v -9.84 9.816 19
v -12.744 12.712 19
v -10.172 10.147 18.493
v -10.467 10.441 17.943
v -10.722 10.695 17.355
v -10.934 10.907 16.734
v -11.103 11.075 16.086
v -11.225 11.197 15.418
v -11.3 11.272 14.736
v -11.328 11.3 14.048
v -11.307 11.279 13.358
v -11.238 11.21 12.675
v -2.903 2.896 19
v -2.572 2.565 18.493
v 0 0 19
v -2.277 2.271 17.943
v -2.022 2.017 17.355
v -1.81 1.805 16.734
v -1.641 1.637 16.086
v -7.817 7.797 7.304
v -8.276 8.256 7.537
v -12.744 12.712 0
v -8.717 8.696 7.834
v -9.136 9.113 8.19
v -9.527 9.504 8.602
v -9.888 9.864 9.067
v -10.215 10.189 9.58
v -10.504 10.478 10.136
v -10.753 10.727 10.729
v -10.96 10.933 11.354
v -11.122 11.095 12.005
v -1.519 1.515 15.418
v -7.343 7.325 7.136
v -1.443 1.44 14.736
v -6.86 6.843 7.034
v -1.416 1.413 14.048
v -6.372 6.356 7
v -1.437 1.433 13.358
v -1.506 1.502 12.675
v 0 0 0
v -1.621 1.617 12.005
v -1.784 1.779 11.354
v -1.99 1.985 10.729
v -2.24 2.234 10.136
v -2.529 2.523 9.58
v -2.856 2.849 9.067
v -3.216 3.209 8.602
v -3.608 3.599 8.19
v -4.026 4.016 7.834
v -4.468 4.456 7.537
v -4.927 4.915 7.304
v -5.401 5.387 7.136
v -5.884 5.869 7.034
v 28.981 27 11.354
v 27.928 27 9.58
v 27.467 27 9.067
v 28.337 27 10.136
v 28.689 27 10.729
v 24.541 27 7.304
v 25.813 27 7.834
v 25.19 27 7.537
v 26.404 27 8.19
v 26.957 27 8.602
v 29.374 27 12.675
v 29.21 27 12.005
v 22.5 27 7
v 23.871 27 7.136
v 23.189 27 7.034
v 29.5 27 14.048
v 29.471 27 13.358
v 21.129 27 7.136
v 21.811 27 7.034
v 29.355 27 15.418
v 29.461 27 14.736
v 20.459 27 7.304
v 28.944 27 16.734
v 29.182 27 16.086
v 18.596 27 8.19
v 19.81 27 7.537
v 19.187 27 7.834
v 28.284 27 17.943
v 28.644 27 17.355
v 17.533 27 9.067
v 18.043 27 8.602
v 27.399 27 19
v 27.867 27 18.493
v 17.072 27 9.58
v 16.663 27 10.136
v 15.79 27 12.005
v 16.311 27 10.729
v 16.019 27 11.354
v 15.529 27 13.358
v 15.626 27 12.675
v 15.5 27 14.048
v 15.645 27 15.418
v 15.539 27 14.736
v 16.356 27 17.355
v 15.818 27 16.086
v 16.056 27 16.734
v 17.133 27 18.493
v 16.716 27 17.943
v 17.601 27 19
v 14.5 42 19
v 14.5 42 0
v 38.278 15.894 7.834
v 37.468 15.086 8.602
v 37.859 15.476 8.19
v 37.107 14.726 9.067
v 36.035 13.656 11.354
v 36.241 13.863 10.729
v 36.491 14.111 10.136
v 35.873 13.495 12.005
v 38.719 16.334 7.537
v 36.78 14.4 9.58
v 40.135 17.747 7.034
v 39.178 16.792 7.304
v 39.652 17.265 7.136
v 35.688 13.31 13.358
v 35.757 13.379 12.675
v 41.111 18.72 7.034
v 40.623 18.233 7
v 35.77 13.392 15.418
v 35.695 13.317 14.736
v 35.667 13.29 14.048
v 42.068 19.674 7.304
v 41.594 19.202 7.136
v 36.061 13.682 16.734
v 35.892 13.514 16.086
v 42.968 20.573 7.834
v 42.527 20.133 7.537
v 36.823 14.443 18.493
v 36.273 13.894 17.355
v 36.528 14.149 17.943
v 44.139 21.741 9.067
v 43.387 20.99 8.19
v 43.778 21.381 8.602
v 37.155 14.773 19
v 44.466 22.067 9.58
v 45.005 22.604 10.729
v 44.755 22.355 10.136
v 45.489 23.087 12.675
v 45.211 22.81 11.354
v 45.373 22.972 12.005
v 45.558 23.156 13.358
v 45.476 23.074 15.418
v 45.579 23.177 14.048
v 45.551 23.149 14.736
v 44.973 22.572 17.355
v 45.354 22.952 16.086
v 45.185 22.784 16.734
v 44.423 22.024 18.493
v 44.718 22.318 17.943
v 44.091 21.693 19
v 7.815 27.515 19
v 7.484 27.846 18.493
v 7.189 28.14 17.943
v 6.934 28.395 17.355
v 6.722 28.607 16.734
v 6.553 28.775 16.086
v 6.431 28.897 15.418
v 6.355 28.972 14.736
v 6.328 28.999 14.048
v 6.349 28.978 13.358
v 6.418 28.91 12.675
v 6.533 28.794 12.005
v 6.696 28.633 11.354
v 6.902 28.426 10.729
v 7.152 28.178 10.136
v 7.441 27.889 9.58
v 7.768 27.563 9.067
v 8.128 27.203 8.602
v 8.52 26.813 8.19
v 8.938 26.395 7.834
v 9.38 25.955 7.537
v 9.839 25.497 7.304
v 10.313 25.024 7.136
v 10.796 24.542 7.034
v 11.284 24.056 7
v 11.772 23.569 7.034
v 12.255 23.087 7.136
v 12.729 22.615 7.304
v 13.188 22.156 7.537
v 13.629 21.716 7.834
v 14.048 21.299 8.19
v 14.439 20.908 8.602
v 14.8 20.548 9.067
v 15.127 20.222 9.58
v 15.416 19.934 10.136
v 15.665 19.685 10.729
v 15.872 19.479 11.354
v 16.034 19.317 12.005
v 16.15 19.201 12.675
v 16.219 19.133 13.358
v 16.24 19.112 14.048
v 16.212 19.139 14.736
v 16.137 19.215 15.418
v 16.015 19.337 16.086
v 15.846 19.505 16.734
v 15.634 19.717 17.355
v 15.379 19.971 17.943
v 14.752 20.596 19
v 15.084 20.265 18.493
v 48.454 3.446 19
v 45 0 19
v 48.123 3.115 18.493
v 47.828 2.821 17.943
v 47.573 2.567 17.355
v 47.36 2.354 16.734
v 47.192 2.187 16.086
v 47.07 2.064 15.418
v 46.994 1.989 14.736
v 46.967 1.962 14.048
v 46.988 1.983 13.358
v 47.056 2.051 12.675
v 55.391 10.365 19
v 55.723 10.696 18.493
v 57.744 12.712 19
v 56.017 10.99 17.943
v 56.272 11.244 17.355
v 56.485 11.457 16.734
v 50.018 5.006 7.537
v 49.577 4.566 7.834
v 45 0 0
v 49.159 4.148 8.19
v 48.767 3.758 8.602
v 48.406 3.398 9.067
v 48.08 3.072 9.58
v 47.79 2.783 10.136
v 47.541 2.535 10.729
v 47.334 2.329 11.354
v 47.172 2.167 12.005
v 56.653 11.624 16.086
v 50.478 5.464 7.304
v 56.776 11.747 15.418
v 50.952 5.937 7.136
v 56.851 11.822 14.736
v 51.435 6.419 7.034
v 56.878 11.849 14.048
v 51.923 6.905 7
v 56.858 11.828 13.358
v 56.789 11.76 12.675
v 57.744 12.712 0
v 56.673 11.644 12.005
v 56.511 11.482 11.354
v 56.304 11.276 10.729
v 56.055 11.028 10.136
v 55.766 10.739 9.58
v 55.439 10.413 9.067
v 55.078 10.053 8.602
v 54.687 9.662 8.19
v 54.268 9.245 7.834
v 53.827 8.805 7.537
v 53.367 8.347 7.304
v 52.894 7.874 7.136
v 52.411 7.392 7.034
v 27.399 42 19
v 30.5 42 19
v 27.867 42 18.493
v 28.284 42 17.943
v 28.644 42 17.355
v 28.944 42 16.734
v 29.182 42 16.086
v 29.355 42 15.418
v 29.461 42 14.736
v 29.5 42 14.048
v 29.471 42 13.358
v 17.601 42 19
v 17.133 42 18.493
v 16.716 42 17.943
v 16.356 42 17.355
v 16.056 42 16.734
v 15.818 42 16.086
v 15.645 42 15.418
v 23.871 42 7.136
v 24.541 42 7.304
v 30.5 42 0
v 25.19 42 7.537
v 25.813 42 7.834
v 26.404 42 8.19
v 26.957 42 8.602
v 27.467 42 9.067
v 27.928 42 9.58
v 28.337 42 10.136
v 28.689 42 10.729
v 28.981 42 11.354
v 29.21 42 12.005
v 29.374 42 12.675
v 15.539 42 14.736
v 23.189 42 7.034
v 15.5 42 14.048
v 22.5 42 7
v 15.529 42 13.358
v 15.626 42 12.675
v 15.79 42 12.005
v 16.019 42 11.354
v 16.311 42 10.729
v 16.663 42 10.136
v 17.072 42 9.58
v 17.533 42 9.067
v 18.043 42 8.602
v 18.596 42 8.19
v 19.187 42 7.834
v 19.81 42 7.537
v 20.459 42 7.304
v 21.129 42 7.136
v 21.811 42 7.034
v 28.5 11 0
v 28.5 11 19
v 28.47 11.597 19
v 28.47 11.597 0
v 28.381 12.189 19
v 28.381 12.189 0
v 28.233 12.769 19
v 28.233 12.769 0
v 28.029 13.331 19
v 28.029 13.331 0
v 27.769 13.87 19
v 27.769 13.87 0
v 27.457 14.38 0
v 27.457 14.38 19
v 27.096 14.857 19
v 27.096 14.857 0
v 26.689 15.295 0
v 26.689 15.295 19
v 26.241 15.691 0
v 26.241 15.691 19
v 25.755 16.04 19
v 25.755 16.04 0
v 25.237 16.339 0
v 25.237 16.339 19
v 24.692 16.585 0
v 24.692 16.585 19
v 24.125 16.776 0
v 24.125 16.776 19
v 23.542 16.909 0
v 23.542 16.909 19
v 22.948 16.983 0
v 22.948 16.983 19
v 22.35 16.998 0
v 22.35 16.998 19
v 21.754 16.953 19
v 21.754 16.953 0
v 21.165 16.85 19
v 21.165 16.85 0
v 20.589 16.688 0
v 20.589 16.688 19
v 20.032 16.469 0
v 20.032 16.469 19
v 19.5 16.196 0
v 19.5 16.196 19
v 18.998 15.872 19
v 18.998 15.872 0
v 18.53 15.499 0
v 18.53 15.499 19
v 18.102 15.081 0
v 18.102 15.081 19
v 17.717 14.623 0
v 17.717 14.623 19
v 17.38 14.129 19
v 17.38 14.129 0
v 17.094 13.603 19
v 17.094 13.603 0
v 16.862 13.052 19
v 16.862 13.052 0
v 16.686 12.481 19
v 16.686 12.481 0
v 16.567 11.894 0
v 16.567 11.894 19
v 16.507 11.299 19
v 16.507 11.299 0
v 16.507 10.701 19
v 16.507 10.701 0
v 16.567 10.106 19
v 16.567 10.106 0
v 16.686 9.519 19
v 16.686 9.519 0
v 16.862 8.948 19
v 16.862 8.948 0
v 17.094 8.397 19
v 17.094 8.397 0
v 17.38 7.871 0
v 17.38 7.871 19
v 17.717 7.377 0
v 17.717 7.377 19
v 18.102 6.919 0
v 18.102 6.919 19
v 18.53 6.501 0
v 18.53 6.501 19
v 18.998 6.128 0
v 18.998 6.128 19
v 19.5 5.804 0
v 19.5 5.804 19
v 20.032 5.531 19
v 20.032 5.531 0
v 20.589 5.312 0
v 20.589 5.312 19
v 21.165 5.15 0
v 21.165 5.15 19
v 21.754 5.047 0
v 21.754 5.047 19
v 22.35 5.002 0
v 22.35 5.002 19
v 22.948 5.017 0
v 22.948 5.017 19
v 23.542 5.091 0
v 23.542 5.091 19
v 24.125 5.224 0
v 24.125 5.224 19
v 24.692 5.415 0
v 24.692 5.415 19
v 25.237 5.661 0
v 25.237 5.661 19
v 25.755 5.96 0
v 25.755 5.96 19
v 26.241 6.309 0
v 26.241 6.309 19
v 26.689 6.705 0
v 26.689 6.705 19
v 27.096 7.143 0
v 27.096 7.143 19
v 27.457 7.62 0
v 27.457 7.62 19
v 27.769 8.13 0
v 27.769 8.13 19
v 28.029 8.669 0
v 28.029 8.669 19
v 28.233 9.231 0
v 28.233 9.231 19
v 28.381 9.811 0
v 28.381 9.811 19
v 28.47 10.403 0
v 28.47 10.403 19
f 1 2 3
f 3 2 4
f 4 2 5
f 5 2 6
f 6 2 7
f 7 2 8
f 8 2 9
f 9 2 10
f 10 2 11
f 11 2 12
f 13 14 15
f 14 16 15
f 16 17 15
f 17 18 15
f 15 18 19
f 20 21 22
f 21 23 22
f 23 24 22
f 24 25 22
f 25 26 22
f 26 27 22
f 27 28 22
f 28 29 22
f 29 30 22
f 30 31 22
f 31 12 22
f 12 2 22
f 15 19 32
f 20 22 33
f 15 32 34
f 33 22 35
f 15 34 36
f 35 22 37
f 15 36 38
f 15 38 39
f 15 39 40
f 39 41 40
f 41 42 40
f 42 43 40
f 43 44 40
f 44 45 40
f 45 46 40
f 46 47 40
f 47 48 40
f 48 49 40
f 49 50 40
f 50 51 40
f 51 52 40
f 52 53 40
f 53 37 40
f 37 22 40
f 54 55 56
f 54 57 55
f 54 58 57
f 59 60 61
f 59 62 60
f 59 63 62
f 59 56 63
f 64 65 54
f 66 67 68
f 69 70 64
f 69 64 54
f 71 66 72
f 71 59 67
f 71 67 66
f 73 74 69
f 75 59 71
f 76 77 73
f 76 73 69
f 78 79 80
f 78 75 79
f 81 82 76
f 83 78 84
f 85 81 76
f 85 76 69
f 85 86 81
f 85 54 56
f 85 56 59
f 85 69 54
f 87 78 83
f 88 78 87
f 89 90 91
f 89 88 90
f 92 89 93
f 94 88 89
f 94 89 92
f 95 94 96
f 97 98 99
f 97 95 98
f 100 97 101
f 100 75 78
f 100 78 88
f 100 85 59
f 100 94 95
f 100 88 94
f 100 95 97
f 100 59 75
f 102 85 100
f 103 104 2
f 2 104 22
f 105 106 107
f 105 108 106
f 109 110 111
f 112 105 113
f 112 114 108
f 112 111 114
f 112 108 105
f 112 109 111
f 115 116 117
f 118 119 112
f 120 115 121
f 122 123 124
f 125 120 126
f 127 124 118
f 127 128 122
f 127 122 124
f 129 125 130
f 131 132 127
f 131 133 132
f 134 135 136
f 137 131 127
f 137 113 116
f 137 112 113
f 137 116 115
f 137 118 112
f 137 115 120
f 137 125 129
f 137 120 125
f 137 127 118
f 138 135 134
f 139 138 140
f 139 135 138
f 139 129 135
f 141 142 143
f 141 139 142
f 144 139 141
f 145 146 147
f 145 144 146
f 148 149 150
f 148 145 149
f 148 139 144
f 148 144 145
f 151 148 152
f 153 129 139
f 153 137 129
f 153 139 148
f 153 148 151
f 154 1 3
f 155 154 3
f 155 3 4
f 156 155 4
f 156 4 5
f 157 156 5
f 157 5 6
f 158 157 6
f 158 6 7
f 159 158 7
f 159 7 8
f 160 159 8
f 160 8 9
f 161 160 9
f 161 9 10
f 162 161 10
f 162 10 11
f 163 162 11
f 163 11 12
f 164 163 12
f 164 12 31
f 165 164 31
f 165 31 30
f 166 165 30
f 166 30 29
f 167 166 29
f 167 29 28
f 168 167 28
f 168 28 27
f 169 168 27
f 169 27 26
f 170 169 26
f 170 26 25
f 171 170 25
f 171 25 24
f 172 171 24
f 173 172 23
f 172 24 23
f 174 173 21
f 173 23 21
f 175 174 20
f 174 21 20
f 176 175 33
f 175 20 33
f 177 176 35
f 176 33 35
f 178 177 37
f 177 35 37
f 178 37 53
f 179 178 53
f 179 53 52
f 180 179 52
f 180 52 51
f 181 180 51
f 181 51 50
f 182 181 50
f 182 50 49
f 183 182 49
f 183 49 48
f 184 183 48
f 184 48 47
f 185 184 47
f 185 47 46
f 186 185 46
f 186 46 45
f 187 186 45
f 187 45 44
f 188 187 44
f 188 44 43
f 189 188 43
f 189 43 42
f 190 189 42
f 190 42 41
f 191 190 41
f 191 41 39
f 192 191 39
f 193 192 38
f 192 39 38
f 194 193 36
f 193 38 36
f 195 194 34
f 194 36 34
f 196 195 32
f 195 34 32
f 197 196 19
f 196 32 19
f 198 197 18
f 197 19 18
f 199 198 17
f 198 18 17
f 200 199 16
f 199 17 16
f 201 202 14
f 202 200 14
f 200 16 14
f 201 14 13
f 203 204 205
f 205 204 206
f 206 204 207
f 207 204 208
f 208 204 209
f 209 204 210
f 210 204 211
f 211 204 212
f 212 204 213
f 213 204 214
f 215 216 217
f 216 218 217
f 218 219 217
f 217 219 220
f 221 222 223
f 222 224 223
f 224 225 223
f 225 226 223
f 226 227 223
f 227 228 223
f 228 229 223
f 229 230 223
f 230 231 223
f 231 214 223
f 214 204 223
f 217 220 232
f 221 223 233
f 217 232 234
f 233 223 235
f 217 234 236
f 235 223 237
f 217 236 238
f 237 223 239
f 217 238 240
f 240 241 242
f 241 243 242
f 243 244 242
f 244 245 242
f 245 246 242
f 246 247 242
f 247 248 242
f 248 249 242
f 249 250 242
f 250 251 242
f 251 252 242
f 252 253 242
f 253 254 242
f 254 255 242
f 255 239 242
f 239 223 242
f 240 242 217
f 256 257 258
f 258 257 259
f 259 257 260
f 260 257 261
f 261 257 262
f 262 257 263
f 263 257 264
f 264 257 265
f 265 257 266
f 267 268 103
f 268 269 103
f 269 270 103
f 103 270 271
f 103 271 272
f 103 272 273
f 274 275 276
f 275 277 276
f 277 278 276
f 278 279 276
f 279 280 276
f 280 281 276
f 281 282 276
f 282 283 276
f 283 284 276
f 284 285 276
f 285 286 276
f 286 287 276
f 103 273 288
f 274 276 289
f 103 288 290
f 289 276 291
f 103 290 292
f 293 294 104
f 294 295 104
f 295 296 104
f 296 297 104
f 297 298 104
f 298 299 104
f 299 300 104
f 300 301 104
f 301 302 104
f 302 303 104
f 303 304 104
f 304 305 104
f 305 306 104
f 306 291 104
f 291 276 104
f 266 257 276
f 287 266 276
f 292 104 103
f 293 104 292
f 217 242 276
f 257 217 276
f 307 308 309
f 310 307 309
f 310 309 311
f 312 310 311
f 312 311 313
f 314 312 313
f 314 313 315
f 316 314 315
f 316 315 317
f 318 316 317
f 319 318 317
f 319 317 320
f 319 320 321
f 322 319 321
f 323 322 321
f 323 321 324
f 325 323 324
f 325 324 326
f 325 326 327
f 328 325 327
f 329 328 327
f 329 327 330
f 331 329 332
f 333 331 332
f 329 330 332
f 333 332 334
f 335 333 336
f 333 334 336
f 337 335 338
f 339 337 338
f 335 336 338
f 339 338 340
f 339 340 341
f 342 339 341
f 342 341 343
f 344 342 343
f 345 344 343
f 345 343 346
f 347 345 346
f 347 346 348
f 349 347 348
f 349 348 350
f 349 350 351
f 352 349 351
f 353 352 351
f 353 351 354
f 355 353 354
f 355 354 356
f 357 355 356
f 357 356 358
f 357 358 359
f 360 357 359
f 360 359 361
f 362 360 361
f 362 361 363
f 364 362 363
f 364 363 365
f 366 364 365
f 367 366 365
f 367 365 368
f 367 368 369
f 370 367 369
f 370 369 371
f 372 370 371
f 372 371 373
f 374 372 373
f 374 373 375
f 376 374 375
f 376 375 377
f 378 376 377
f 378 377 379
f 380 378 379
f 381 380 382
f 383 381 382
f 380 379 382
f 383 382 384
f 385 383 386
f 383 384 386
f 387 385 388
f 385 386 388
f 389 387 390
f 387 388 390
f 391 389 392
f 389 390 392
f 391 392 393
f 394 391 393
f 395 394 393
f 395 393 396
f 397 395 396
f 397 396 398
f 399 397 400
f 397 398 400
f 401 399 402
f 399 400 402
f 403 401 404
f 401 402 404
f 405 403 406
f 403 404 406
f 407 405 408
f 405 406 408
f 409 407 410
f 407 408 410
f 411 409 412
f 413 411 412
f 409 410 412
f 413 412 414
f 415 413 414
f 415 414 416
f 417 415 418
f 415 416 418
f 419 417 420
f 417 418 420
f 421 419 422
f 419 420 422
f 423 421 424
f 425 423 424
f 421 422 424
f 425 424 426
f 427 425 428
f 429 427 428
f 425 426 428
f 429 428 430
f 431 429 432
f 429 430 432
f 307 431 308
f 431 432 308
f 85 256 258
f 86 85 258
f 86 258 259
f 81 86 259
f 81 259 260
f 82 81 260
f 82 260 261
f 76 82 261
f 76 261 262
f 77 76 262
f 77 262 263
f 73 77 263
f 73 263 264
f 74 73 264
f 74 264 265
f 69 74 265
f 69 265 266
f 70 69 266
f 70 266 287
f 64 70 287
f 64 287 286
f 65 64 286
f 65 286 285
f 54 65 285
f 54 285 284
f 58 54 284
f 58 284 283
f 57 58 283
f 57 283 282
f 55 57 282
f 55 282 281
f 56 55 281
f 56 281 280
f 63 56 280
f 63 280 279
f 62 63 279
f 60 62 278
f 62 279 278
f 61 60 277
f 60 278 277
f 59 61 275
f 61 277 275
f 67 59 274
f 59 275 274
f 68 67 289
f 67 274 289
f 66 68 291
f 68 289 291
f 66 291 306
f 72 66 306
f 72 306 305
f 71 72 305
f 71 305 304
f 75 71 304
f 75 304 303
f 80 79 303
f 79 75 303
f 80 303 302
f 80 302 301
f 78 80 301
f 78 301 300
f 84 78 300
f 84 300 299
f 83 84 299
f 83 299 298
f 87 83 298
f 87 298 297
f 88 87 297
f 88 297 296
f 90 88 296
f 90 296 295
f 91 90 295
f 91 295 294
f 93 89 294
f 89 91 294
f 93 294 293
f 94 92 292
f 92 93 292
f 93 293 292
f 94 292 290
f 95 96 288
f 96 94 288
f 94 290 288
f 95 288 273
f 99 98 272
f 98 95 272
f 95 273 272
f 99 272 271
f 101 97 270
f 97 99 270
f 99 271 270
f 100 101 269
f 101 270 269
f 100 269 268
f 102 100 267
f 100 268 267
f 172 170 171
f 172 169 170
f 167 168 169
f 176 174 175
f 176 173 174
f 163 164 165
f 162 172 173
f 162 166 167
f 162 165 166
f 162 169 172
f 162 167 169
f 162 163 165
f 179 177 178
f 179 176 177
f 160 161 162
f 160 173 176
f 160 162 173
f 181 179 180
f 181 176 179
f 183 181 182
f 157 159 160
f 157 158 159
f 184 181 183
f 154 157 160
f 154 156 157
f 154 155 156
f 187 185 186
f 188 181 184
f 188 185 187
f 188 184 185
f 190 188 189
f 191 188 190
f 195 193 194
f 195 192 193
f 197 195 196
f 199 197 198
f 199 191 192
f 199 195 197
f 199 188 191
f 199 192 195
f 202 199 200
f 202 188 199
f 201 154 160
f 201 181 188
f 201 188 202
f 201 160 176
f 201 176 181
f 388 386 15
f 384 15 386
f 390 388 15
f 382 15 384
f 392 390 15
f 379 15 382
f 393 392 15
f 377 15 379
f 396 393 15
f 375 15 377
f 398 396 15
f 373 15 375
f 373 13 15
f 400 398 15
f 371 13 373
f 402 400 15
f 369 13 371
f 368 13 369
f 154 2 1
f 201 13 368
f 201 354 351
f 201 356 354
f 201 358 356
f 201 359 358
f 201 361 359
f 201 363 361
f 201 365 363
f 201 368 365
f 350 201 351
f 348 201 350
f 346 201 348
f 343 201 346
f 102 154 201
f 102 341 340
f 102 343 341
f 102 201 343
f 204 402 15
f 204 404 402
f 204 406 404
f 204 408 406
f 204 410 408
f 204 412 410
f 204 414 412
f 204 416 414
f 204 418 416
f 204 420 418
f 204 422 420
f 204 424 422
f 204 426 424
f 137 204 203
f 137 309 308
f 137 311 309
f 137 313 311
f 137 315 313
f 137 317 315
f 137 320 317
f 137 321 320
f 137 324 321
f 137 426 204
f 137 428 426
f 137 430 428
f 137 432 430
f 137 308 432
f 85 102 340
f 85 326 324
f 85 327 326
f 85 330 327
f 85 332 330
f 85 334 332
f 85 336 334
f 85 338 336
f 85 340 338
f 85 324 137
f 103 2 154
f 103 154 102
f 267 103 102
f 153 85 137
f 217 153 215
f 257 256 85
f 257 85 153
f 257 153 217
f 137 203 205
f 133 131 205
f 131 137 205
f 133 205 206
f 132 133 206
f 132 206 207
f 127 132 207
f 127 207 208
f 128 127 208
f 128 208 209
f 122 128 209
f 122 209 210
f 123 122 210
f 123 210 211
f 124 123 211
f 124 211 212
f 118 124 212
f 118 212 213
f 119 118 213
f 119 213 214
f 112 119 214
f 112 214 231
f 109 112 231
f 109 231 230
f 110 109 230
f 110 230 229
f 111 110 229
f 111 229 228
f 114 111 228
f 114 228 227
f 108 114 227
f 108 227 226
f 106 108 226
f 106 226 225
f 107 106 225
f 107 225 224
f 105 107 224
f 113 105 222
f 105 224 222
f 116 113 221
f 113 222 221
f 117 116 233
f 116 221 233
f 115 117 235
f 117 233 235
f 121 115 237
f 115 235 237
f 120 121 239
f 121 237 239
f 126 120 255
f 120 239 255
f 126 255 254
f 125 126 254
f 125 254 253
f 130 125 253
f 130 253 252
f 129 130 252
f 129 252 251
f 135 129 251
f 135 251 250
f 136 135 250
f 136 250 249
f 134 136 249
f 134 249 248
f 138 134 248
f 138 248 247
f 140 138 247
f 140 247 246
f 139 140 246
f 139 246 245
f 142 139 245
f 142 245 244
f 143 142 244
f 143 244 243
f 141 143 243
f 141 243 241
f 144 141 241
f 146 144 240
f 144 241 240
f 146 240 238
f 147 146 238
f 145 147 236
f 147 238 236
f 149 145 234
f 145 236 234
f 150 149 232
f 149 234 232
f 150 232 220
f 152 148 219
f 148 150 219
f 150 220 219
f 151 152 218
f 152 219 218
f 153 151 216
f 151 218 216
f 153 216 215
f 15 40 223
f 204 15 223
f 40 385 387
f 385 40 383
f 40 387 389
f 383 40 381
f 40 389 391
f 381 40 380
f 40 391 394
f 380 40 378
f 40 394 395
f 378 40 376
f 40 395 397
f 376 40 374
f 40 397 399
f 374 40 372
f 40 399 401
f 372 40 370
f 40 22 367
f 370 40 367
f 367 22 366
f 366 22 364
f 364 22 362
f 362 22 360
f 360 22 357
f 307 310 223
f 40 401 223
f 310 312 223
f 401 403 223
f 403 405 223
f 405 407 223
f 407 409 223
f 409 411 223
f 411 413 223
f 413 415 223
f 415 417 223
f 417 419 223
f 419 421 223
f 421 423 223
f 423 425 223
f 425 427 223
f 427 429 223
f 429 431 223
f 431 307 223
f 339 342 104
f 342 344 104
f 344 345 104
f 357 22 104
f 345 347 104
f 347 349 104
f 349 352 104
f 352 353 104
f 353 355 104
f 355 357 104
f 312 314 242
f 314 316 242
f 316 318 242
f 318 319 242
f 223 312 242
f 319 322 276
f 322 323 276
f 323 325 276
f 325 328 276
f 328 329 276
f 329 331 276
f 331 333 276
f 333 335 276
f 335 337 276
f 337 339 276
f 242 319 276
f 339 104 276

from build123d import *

# Parameters (mm, degrees)
F1_DEPTH = 19
F2_R     = 7
F3_DEPTH = 16
F4_R     = 7
F5_DEPTH = 25
F6_R     = 7
F7_DEPTH = 15
F8_R     = 6
F9_DEPTH = 19.001


with BuildPart() as f1:
    # F0 (on Top) → F1 (new body)
    with BuildSketch(Plane.XY):
        Polygon((-12.7437102583, 12.7121142558), (0, 0), (45, 0), (57.7437102583, 12.7121142558), (30.5, 42), (22.5, 42), (14.5, 42), align=None)
    extrude(amount=F1_DEPTH)

    # F2 (on face) → F3 (cut)
    with BuildSketch(Plane(origin=(22.4441456741, -22.4999306731, 0), x_dir=(0.7079839032, 0.7062285698, 0), z_dir=(0.7062285698, -0.7079839032, 0))):
        with Locations((41.6372567415, 14)):
            Circle(F2_R)
    extrude(amount=-F3_DEPTH, mode=Mode.SUBTRACT)

    # F4 (on face) → F5 (cut)
    with BuildSketch(Plane(origin=(0, 0, 0), x_dir=(0.7079839032, -0.7062285698, 0), z_dir=(-0.7062285698, -0.7079839032, 0))):
        with Locations((-9, 14)):
            Circle(F4_R)
    extrude(amount=-F5_DEPTH, mode=Mode.SUBTRACT)

    # F6 (on face) → F7 (cut)
    with BuildSketch(Plane(origin=(0, 42, 0), x_dir=(-1, 0, 0), z_dir=(0, 1, 0))):
        with Locations((-22.5, 14)):
            Circle(F6_R)
    extrude(amount=-F7_DEPTH, mode=Mode.SUBTRACT)

    # F8 (on face) → F9 (cut, through all)
    with BuildSketch(Plane.XY.offset(19)):
        with Locations((22.5, 11)):
            Circle(F8_R)
    extrude(amount=-F9_DEPTH, mode=Mode.SUBTRACT)


solid = f1.part
